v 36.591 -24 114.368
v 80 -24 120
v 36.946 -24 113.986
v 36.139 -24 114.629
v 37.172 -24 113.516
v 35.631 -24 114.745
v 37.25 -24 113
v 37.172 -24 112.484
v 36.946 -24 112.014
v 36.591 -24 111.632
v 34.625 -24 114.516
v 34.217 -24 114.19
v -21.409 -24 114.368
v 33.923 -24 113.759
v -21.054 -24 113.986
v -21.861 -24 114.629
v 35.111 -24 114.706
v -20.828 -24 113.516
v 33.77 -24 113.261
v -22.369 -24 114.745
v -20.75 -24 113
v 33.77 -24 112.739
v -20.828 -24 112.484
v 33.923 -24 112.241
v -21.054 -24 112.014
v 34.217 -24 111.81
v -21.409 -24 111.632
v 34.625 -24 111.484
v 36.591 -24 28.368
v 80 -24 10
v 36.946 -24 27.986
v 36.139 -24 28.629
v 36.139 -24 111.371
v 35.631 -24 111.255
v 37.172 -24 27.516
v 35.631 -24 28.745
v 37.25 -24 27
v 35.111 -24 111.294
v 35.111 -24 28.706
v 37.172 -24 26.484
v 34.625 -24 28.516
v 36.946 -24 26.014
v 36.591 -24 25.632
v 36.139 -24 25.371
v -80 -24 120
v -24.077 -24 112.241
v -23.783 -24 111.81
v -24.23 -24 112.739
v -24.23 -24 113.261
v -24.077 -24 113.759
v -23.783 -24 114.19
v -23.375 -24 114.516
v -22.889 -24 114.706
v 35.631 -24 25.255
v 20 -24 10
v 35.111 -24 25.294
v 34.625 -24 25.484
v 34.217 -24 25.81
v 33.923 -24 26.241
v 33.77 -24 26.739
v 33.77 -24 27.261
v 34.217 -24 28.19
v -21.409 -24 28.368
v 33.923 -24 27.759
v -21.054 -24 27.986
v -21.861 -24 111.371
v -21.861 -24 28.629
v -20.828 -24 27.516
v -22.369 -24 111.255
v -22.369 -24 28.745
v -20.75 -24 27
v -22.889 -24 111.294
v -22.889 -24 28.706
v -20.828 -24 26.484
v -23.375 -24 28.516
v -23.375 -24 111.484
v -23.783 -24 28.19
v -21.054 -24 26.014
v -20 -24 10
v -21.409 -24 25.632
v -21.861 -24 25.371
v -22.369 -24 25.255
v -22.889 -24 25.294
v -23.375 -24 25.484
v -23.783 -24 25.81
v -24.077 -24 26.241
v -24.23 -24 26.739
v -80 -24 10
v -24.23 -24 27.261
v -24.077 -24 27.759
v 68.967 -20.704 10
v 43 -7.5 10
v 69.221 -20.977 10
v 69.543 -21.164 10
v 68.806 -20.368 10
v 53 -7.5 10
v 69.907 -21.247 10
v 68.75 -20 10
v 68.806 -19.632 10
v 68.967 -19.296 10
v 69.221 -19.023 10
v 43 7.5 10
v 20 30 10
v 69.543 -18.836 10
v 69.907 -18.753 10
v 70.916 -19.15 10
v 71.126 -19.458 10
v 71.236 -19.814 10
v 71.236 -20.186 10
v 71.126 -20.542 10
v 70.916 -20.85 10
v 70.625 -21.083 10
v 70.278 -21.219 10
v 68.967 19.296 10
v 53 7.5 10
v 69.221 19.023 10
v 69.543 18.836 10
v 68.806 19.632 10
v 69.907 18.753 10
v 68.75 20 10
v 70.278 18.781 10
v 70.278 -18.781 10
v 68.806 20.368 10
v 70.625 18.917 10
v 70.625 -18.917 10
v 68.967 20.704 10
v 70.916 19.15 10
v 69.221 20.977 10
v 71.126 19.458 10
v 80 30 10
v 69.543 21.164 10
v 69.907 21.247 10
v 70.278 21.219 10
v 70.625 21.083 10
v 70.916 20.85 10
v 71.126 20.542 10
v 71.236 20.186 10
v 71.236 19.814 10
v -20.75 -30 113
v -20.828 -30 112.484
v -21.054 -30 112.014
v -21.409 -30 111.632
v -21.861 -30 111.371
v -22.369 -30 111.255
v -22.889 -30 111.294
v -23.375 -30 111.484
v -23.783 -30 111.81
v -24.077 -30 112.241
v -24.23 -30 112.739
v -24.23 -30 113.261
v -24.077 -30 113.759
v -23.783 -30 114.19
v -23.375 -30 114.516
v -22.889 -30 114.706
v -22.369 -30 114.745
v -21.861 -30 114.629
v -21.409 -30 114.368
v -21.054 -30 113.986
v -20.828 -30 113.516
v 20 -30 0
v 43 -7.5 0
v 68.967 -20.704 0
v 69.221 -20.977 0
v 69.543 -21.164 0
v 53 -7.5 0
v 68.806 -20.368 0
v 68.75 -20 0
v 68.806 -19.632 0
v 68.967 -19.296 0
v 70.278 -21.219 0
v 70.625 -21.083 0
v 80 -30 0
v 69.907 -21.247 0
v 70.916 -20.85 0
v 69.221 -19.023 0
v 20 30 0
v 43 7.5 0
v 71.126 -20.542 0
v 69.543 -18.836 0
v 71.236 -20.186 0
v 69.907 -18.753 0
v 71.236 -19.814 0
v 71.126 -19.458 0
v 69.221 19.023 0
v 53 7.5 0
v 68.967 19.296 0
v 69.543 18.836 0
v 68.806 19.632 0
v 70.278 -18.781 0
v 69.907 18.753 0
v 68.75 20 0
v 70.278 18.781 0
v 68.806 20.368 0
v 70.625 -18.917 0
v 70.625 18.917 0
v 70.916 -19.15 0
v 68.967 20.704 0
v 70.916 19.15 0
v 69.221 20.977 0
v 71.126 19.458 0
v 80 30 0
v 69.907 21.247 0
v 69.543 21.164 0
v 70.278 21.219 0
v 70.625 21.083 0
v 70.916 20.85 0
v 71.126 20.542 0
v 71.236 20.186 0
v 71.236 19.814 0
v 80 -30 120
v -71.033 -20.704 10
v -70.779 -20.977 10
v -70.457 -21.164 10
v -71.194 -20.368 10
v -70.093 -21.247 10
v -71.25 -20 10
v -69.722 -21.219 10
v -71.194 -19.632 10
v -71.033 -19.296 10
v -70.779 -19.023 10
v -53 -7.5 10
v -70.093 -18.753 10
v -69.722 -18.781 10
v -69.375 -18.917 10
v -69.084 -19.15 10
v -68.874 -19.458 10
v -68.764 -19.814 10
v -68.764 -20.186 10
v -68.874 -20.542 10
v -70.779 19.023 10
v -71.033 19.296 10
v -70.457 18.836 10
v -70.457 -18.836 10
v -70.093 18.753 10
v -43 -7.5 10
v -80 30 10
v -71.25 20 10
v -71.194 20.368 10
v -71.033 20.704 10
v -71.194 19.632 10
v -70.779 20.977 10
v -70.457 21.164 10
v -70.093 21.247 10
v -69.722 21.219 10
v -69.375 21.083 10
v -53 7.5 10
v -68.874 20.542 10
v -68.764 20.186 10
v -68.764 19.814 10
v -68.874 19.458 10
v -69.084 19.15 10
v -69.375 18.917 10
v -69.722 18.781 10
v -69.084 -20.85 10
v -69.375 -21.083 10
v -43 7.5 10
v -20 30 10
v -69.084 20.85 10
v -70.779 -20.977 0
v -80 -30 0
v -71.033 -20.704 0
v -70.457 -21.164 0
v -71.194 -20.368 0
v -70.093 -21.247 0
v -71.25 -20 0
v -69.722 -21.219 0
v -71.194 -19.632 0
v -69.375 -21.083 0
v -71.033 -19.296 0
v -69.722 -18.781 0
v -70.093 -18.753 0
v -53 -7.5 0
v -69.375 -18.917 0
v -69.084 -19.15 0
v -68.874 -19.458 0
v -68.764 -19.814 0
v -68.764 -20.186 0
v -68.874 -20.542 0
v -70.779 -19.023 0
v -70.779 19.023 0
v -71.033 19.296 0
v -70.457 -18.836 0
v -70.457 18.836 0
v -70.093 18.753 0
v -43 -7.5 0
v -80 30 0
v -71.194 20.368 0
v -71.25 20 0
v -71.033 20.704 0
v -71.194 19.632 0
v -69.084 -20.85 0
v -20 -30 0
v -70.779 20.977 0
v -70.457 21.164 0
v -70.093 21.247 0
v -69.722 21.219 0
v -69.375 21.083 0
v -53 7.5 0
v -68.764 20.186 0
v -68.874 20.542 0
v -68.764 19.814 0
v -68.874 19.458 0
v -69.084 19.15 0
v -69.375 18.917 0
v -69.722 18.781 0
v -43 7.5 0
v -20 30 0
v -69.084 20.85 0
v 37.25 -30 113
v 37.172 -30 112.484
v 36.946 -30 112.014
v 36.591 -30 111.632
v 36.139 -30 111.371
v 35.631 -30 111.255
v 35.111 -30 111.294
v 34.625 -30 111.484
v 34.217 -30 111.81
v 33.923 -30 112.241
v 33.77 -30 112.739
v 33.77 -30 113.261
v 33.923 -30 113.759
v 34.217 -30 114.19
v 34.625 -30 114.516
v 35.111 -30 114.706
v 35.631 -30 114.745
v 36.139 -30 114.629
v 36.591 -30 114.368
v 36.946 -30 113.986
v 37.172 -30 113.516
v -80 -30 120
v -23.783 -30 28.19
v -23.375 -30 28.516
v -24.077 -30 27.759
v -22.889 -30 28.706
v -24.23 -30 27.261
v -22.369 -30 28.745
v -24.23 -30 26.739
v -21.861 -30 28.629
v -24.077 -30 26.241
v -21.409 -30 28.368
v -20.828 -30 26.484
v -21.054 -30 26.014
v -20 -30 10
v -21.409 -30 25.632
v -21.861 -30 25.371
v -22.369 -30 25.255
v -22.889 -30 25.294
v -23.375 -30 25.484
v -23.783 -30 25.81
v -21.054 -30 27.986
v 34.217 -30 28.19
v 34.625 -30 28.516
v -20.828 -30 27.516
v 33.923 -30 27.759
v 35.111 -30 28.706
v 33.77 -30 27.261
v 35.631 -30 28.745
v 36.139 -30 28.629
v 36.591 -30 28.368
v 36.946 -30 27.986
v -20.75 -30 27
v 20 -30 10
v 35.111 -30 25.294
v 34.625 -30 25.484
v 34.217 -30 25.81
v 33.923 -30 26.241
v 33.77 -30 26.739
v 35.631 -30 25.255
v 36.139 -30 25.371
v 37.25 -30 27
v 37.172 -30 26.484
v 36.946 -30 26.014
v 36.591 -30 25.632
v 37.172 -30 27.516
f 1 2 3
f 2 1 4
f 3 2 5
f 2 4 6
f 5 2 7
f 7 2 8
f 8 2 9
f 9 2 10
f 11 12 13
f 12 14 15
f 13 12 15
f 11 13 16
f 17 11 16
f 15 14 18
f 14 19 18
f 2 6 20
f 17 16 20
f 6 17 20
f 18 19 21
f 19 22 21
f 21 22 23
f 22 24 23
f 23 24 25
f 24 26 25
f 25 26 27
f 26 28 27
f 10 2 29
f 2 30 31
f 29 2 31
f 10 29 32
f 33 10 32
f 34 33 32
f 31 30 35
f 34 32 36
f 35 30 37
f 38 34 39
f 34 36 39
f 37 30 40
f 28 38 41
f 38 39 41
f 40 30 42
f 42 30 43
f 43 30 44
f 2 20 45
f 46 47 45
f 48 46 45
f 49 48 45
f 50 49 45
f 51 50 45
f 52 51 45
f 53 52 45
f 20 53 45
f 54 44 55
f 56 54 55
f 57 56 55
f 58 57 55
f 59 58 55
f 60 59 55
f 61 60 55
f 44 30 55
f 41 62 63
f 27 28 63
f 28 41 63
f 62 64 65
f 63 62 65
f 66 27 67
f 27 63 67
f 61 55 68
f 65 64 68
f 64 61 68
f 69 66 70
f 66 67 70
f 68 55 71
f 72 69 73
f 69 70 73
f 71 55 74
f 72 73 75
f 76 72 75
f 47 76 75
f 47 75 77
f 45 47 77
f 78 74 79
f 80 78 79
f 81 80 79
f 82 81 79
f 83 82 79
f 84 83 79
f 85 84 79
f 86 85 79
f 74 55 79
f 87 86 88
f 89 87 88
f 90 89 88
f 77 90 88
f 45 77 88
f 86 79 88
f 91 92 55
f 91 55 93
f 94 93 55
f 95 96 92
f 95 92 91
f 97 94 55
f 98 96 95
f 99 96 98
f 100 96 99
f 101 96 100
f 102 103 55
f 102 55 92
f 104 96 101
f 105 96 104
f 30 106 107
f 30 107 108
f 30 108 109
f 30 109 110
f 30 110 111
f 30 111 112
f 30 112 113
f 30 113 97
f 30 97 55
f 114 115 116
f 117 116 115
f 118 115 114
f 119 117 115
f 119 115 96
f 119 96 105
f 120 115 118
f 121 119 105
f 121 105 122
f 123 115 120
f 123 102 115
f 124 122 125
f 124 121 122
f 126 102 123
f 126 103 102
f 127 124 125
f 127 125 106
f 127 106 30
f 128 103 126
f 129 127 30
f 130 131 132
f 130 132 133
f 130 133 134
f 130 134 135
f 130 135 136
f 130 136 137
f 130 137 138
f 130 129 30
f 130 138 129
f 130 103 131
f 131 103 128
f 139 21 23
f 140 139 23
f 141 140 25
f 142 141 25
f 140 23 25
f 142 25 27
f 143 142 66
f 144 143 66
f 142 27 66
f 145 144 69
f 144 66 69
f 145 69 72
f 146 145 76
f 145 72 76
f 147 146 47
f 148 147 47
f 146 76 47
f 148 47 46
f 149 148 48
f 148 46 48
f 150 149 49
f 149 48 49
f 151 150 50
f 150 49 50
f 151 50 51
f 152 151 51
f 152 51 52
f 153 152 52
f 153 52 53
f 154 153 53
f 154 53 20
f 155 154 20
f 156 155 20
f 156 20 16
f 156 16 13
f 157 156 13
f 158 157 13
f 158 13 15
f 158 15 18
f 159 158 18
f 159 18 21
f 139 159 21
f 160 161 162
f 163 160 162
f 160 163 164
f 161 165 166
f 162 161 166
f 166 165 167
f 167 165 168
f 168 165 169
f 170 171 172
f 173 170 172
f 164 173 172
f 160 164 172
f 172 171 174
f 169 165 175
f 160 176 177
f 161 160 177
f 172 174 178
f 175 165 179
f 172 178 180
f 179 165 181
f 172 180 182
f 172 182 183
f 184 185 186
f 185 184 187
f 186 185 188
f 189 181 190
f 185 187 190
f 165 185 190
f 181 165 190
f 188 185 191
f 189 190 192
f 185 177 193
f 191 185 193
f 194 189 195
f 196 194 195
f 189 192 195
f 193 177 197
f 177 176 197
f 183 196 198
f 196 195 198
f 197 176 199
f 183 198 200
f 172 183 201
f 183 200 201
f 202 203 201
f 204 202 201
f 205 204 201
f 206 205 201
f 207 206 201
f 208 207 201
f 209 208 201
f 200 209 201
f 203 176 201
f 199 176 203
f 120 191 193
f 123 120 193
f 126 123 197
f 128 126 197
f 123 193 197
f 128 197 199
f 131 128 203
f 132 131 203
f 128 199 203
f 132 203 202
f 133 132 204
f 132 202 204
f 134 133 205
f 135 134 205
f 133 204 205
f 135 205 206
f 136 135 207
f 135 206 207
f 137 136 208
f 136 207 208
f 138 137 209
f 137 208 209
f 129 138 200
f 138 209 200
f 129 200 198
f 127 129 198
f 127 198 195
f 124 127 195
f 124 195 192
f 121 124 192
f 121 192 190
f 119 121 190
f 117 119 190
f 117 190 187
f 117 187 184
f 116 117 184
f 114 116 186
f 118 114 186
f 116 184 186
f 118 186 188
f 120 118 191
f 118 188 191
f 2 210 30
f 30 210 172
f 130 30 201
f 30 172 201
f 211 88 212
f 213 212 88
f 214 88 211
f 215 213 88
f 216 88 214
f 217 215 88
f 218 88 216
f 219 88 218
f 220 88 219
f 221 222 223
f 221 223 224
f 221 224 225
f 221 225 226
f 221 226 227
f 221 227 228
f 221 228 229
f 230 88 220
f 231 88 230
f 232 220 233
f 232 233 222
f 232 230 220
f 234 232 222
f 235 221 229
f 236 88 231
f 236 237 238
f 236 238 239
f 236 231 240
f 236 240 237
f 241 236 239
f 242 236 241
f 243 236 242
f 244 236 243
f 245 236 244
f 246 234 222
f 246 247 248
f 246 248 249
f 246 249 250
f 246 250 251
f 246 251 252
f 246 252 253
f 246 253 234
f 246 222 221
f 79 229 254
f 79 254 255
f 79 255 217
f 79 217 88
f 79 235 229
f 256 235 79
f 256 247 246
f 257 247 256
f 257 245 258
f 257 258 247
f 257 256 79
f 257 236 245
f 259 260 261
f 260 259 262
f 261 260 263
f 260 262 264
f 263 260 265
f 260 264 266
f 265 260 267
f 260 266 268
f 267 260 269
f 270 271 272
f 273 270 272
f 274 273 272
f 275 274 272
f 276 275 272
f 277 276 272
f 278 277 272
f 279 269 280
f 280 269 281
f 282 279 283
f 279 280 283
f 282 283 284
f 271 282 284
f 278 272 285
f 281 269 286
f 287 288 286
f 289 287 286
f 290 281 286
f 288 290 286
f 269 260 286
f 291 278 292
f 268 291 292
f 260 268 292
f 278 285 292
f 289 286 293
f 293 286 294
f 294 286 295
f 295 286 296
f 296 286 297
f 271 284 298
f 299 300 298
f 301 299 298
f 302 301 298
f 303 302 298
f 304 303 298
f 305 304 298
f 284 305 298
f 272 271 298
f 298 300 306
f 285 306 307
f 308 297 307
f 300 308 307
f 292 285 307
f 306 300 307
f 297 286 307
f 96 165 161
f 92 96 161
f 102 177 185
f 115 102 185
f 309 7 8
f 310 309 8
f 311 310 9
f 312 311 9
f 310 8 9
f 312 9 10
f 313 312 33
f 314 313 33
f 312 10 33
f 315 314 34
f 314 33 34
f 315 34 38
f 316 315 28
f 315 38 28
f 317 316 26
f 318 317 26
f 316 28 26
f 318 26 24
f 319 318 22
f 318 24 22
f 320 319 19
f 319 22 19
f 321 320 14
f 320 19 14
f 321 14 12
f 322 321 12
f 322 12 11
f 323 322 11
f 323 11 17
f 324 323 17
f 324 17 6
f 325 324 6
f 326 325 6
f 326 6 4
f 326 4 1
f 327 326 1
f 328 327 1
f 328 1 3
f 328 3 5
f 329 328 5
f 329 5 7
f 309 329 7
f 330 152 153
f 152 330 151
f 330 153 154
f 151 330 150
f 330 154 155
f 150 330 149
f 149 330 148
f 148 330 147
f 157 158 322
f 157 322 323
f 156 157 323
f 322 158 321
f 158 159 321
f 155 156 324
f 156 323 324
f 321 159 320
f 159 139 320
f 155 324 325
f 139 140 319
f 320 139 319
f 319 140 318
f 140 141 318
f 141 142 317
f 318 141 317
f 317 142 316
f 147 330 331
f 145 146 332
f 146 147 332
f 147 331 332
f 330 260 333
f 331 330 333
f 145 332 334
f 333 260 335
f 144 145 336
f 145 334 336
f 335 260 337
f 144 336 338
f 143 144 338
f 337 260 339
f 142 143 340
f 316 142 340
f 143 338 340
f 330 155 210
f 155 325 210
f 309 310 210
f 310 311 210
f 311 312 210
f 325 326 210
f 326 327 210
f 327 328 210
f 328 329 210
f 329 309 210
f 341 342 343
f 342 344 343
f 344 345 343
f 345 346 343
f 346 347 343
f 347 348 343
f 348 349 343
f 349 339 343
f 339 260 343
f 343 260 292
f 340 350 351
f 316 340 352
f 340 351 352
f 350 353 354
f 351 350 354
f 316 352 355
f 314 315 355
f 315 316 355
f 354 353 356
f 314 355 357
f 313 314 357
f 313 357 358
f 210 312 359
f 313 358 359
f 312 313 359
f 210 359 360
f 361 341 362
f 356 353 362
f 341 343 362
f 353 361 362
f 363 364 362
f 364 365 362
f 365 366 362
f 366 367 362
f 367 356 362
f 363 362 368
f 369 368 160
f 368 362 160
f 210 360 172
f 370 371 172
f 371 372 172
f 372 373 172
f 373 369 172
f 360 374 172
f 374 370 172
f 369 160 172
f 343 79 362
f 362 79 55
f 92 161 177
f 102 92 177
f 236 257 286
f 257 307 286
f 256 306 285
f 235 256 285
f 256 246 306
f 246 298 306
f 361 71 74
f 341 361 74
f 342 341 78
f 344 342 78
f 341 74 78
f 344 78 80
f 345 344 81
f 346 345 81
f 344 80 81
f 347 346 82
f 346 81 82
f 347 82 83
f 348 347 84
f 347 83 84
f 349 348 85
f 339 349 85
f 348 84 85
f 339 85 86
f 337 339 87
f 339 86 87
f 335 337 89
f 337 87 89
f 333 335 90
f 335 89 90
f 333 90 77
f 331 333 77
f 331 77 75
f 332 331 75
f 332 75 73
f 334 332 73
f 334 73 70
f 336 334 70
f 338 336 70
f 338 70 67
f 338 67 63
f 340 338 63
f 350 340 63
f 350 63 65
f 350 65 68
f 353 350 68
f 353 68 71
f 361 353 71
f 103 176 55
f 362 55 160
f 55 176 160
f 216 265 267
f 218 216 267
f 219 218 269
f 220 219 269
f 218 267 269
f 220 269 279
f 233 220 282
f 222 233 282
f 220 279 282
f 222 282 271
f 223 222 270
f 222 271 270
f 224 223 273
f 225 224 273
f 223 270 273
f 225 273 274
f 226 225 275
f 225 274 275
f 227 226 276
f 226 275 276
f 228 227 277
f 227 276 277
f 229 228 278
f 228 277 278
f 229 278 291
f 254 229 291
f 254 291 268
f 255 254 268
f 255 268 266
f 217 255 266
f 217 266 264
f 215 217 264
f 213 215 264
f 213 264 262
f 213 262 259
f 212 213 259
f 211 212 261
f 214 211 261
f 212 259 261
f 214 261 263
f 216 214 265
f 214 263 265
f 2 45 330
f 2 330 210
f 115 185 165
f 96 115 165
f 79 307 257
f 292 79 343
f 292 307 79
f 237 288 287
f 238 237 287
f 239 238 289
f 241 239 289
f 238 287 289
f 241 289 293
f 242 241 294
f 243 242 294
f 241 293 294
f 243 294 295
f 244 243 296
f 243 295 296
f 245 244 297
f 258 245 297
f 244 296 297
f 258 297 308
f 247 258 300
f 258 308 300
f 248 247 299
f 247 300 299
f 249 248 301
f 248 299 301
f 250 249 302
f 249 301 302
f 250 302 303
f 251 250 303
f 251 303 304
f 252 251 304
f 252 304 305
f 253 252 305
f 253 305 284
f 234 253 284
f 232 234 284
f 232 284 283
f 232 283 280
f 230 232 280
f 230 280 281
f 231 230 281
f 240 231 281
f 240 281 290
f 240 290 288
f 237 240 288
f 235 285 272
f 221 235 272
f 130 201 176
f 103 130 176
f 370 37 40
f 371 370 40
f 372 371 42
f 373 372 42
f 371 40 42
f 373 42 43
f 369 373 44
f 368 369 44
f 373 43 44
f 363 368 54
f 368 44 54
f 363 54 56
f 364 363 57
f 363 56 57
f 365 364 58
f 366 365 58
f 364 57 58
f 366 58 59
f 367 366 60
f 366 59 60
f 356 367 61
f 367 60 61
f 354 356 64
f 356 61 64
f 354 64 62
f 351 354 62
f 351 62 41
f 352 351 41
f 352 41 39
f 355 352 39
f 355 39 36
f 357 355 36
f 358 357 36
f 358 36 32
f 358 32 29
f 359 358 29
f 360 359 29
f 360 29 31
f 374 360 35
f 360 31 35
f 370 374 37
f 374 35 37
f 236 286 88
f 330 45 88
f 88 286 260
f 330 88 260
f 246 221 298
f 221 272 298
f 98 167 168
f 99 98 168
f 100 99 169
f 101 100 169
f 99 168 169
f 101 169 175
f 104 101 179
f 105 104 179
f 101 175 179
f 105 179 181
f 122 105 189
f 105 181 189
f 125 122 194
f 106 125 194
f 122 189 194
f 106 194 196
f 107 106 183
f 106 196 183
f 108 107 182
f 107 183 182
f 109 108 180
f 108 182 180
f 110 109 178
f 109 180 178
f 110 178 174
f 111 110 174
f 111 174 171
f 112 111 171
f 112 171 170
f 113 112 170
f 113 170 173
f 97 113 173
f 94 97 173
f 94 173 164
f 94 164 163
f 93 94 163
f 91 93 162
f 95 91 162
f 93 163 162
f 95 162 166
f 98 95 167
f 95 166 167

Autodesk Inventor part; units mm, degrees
ref_plane "YZ Plane" through (0, 0, 0) normal (1, 0, 0) x (0, 1, 0)
ref_plane "XZ Plane" through (0, 0, 0) normal (0, 1, 0) x (-1, 0, 0)
ref_plane "XY Plane" through (0, 0, 0) normal (0, 0, 1) x (1, 0, 0)
sketch "Sketch1" plane through (0, 0, 0) normal (0, 0, 1) x (1, 0, 0)
  line L0 (80, 30) -> (-80, 30)
  line L1 (-80, 30) -> (-80, -30)
  line L2 (-80, -30) -> (80, -30)
  line L3 (80, -30) -> (80, 30)
  line L4 (80, 30) -> (-80, -30) construction
  line L5 (-80, 30) -> (80, -30) construction
  line L6 (-20, -30) -> (-80, -30)
  line L7 (-80, -30) -> (-80, 30)
  line L8 (-80, 30) -> (-20, 30)
  line L9 (-20, 30) -> (-20, -30)
  line L10 (-20, -30) -> (-80, 30) construction
  line L11 (-80, -30) -> (-20, 30) construction
  line L12 (20, -30) -> (80, -30)
  line L13 (80, -30) -> (80, 30)
  line L14 (80, 30) -> (20, 30)
  line L15 (20, 30) -> (20, -30)
  line L16 (20, -30) -> (80, 30) construction
  line L17 (80, -30) -> (20, 30) construction
  line L18 (0, 30) -> (0, -30) construction
  point P0 (0, 0)
  point P1 (-50, 0)
  point P2 (50, 0)
  point P3 (20, 30)
  point P4 (20, -30)
  point P5 (-20, -30)
  point P6 (-20, 30)
  dimension "d0" = 160
  dimension "d1" = 60
  dimension "d2" = 40
extrude "Extrusion1" add sketch "Sketch1" along normal blind 10 contours L3 L2 L15 L0 | L9 L2 L1 L0
sketch "Sketch2" plane through (0, 0, 10) normal (0, 0, 1) x (1, 0, 0)
  line L0 (-80, -30) -> (-20, -30) projected
  line L1 (80, -24) -> (-80, -24)
  line L2 (-80, -24) -> (-80, -30)
  line L3 (-80, -30) -> (80, -30)
  line L4 (80, -30) -> (80, -24)
  line L5 (80, -24) -> (-80, -30) construction
  line L6 (-80, -24) -> (80, -30) construction
  line L7 (80, -30) -> (80, 30) projected
  point P0 (0, 0)
  point P1 (0, -27)
  dimension "d5" = 6
extrude "Extrusion2" add sketch "Sketch2" along normal blind 110
sketch "Sketch3" plane through (0, 0, 0) normal (0, 0, -1) x (-1, 0, 0)
  line L0 (53, 7.5) -> (43, 7.5)
  line L1 (43, 7.5) -> (43, -7.5)
  line L2 (43, -7.5) -> (53, -7.5)
  line L3 (53, -7.5) -> (53, 7.5)
  line L4 (53, 7.5) -> (43, -7.5) construction
  line L5 (43, 7.5) -> (53, -7.5) construction
  line L6 (-43, 7.5) -> (-53, 7.5)
  line L7 (-53, 7.5) -> (-53, -7.5)
  line L8 (-53, -7.5) -> (-43, -7.5)
  line L9 (-43, -7.5) -> (-43, 7.5)
  line L10 (-43, 7.5) -> (-53, -7.5) construction
  line L11 (-53, 7.5) -> (-43, -7.5) construction
  line L12 (80, -30) -> (-80, -30) construction
  line L13 (0, -30) -> (0, 0) construction
  point P0 (48, 0)
  point P1 (-48, 0)
  point P2 (48, 0)
  dimension "d8" = 10
  dimension "d9" = 15
  dimension "d10" = 48
extrude "Extrusion3" cut sketch "Sketch3" against normal through all
sketch "Sketch4" plane through (0, 0, 0) normal (0, 0, -1) x (-1, 0, 0)
  line L0 (-70, -20) -> (70, -20) construction
  line L1 (70, -20) -> (70, 20) construction
  line L2 (70, 20) -> (-70, 20) construction
  line L3 (-70, 20) -> (-70, -20) construction
  line L4 (-70, -20) -> (70, 20) construction
  line L5 (70, -20) -> (-70, 20) construction
  circle A0 centre (70, 20) radius 1.25
  circle A1 centre (-70, 20) radius 1.25
  circle A2 centre (-70, -20) radius 1.25
  circle A3 centre (70, -20) radius 1.25
  point P0 (0, 0)
  dimension "d13" = 140
  dimension "d14" = 40
  dimension "d16" = 2.5
extrude "Extrusion4" cut sketch "Sketch4" against normal through all
sketch "Sketch5" plane through (-20, -24, 10) normal (0, 1, 0) x (1, 0, 0)
  line L0 (59.5, -13) -> (-19.5, -13) construction
  line L1 (-19.5, -13) -> (-19.5, -113) construction
  line L2 (-19.5, -113) -> (59.5, -113) construction
  line L3 (59.5, -113) -> (59.5, -13) construction
  line L4 (59.5, -13) -> (-19.5, -113) construction
  line L5 (-19.5, -13) -> (59.5, -113) construction
  line L6 (100, -110) -> (-60, -110) construction
  line L7 (55.5, -17) -> (-2.5, -17) construction
  line L8 (-2.5, -17) -> (-2.5, -103) construction
  line L9 (-2.5, -103) -> (55.5, -103) construction
  line L10 (55.5, -103) -> (55.5, -17) construction
  line L11 (55.5, -17) -> (-2.5, -103) construction
  line L12 (-2.5, -17) -> (55.5, -103) construction
  circle A0 centre (-2.5, -17) radius 1.75
  circle A1 centre (55.5, -17) radius 1.75
  circle A2 centre (-2.5, -103) radius 1.75
  circle A3 centre (55.5, -103) radius 1.75
  point P0 (20, 10)
  point P1 (20, -63)
  point P2 (20, -63)
  point P3 (26.5, -60)
  point P4 (20, -63)
  point P5 (26.5, -60)
  dimension "d19" = 3
  dimension "d20" = 79
  dimension "d21" = 100
  dimension "d22" = 58
  dimension "d23" = 86
  dimension "d26" = 4
  dimension "d27" = 4
  dimension "d28" = 3.5
extrude "Extrusion5" cut sketch "Sketch5" against normal through all
properties part number "electrical_system_fix_board"
